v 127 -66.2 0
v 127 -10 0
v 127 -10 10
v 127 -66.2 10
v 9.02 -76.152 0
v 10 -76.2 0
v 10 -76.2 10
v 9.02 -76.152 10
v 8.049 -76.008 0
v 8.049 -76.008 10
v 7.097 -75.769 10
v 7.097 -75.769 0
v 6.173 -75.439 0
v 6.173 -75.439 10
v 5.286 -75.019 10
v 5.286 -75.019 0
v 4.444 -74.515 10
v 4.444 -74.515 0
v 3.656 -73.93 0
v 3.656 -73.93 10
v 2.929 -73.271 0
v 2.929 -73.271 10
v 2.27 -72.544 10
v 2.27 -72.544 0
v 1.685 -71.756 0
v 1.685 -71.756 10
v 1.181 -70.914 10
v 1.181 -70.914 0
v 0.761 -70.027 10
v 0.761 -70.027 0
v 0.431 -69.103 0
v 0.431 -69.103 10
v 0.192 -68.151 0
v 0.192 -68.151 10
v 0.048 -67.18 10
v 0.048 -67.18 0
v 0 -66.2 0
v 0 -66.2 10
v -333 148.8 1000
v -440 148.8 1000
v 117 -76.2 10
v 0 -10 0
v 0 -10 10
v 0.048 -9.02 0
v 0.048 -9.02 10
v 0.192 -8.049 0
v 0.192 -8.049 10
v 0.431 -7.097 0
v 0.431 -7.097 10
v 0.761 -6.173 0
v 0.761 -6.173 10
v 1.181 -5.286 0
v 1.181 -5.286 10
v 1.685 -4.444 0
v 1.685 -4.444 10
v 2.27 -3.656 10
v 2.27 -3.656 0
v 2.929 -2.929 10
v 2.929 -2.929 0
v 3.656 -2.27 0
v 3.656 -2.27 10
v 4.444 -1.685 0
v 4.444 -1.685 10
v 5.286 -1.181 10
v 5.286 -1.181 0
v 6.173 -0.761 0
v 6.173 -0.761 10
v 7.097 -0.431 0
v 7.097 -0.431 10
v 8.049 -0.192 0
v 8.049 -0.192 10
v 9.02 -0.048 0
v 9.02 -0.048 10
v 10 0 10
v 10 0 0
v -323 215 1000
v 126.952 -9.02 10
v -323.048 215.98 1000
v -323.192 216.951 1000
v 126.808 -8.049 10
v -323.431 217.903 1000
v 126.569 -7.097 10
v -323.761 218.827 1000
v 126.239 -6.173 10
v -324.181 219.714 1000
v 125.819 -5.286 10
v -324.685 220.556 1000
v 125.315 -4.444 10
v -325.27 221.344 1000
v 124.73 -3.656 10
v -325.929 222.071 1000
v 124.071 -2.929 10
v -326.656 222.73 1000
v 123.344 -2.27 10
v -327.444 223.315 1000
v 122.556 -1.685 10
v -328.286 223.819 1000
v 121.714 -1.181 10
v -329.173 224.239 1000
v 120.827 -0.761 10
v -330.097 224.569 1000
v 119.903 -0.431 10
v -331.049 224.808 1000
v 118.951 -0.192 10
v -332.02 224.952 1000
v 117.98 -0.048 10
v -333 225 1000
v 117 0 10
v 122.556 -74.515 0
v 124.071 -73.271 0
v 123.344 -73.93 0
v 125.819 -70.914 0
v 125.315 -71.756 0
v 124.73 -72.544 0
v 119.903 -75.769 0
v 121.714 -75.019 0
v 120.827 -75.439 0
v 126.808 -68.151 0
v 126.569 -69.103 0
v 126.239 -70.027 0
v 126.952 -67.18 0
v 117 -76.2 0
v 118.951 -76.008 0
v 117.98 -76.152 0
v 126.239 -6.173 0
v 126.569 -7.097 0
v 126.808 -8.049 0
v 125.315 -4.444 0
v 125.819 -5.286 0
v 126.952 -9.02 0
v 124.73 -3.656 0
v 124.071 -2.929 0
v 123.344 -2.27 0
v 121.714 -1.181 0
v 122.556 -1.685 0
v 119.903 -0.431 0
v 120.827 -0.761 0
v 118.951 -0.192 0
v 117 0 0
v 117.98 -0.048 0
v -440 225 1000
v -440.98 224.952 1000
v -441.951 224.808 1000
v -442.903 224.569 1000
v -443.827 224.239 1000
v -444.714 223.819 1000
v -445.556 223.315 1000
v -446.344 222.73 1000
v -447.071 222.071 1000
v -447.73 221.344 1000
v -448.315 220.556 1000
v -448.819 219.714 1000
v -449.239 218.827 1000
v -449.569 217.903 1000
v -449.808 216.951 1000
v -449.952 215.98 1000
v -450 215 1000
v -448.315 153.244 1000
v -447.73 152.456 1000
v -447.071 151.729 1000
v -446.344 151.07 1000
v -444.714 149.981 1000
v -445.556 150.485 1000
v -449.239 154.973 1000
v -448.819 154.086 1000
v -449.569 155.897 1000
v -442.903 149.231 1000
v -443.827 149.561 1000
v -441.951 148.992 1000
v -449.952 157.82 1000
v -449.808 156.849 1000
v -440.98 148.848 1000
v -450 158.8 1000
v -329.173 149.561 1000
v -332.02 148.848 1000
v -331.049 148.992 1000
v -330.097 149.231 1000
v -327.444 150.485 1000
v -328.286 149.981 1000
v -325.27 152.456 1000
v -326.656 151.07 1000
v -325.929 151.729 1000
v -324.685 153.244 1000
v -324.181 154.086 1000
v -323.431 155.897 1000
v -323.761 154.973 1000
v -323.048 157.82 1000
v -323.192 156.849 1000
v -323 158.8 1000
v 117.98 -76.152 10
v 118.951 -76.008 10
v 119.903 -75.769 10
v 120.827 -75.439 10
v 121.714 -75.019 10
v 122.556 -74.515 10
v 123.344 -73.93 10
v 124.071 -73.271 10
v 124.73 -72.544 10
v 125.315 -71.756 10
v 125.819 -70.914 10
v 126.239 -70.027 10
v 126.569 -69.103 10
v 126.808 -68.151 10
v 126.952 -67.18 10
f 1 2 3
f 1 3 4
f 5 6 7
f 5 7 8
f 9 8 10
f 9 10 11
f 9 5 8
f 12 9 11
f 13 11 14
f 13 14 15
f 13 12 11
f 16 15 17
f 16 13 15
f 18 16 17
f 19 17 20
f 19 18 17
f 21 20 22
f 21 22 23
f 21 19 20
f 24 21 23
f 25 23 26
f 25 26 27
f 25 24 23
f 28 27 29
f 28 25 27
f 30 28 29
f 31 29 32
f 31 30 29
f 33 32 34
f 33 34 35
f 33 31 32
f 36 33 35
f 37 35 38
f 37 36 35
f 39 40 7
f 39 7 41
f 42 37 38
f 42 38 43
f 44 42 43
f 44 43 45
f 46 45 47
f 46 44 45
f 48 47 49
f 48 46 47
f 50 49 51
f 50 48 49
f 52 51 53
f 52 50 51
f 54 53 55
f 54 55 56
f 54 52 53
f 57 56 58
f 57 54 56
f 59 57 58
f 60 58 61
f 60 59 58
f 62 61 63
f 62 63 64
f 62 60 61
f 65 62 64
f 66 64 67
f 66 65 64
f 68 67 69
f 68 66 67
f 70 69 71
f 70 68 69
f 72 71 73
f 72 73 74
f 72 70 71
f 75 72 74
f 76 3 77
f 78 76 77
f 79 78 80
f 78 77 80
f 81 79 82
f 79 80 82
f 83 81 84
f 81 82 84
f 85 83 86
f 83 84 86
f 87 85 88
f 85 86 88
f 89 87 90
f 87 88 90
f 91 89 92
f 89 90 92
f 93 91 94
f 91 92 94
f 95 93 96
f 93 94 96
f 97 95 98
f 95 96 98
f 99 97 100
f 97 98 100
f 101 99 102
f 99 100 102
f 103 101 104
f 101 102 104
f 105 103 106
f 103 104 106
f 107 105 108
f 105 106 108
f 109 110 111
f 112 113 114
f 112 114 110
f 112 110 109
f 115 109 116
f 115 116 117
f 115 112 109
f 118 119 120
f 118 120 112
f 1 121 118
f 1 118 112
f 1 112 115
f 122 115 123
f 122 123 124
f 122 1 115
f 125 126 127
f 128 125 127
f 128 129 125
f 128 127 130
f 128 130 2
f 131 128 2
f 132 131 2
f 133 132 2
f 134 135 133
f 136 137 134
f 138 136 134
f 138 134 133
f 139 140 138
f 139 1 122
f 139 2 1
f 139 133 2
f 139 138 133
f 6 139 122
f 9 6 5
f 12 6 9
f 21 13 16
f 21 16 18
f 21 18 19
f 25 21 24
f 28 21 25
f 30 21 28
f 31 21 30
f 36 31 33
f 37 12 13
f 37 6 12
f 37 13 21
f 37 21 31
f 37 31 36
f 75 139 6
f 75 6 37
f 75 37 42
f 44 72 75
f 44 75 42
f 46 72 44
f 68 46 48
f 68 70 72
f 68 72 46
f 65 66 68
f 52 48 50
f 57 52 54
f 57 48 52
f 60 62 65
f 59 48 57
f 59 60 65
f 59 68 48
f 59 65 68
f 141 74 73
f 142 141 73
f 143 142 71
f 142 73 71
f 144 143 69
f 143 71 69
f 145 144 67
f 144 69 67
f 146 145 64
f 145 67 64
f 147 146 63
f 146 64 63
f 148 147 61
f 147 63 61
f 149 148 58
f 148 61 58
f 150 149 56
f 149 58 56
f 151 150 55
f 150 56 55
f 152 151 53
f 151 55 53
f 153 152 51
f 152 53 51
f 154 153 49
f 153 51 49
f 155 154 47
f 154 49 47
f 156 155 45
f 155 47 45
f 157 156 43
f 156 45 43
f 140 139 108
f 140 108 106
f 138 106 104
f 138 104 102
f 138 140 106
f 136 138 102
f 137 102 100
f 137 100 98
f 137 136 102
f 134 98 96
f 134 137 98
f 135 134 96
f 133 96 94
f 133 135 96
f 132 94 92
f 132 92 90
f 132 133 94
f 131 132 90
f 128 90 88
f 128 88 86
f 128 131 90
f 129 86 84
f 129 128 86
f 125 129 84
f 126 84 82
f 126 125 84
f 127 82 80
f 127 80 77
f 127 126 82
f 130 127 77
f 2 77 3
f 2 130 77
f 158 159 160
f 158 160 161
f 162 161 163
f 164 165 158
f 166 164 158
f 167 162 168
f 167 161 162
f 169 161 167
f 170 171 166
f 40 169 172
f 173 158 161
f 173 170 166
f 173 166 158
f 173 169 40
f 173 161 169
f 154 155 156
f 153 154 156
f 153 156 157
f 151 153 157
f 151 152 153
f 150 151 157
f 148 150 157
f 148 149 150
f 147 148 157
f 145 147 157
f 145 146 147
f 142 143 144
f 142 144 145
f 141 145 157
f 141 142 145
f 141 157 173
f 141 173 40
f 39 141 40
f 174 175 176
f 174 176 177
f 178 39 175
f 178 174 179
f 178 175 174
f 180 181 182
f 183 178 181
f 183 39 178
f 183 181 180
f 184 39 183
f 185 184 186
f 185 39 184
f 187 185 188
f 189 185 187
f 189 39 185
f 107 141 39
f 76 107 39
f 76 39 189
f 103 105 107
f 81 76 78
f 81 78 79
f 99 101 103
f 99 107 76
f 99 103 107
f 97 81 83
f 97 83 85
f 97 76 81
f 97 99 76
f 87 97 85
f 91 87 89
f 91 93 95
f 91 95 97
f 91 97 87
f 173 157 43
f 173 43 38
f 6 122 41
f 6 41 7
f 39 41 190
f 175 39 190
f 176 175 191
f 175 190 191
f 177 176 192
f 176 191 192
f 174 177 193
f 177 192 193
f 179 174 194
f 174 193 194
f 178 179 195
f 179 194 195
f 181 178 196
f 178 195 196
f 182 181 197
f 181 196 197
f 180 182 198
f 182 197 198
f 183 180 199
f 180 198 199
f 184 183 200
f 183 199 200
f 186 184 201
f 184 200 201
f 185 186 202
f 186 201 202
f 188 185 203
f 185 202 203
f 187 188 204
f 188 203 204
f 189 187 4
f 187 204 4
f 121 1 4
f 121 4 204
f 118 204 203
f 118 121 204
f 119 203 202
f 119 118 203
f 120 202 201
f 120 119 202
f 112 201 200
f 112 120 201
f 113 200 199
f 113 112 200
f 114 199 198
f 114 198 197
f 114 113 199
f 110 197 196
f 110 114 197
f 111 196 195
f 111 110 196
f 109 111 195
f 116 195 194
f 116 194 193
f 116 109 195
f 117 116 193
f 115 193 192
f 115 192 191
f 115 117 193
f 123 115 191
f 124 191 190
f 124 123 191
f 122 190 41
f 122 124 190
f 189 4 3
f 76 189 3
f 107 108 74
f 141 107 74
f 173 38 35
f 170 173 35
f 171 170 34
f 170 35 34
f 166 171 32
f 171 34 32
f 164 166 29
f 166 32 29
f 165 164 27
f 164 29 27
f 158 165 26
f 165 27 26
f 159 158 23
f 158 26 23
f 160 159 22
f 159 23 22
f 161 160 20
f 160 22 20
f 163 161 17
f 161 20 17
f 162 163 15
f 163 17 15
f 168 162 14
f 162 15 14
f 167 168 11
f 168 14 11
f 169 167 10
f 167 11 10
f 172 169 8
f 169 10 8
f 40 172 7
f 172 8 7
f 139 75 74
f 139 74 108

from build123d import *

# Parameters (mm, degrees)
SALIENTE_EXTRUIR1_DEPTH = 10


with BuildPart() as part:
    # Croquis1 → Saliente-Extruir1 (new body)
    with BuildSketch(Plane.XY):
        with BuildLine():
            Line((10, 0), (117, 0))
            ThreePointArc((117, 0), (124.071067812, -2.928932188), (127, -10))
            Line((127, -10), (127, -66.2))
            ThreePointArc((127, -66.2), (124.071067812, -73.271067812), (117, -76.2))
            Line((117, -76.2), (10, -76.2))
            ThreePointArc((10, -76.2), (2.928932188, -73.271067812), (0, -66.2))
            Line((0, -66.2), (0, -10))
            ThreePointArc((0, -10), (2.928932188, -2.928932188), (10, 0))
        make_face()
    extrude(amount=SALIENTE_EXTRUIR1_DEPTH)

    # Barrer1: sweep along a curve in space
    with BuildLine() as barrer1_path:
        Line((-386.5, 186.9, 1000), (63.5, -38.1, 10))
    # Croquis2 → Barrer1 (sweep)
    with BuildSketch(Plane.XY.offset(10)):
        with BuildLine():
            Line((10, -76.2), (117, -76.2))
            ThreePointArc((117, -76.2), (124.071067812, -73.271067812), (127, -66.2))
            Line((127, -66.2), (127, -10))
            ThreePointArc((127, -10), (124.071067812, -2.928932188), (117, 0))
            Line((117, 0), (10, 0))
            ThreePointArc((10, 0), (2.928932188, -2.928932188), (0, -10))
            Line((0, -10), (0, -66.2))
            ThreePointArc((0, -66.2), (2.928932188, -73.271067812), (10, -76.2))
        make_face()
    sweep(path=barrer1_path.line)


solid = part.part
